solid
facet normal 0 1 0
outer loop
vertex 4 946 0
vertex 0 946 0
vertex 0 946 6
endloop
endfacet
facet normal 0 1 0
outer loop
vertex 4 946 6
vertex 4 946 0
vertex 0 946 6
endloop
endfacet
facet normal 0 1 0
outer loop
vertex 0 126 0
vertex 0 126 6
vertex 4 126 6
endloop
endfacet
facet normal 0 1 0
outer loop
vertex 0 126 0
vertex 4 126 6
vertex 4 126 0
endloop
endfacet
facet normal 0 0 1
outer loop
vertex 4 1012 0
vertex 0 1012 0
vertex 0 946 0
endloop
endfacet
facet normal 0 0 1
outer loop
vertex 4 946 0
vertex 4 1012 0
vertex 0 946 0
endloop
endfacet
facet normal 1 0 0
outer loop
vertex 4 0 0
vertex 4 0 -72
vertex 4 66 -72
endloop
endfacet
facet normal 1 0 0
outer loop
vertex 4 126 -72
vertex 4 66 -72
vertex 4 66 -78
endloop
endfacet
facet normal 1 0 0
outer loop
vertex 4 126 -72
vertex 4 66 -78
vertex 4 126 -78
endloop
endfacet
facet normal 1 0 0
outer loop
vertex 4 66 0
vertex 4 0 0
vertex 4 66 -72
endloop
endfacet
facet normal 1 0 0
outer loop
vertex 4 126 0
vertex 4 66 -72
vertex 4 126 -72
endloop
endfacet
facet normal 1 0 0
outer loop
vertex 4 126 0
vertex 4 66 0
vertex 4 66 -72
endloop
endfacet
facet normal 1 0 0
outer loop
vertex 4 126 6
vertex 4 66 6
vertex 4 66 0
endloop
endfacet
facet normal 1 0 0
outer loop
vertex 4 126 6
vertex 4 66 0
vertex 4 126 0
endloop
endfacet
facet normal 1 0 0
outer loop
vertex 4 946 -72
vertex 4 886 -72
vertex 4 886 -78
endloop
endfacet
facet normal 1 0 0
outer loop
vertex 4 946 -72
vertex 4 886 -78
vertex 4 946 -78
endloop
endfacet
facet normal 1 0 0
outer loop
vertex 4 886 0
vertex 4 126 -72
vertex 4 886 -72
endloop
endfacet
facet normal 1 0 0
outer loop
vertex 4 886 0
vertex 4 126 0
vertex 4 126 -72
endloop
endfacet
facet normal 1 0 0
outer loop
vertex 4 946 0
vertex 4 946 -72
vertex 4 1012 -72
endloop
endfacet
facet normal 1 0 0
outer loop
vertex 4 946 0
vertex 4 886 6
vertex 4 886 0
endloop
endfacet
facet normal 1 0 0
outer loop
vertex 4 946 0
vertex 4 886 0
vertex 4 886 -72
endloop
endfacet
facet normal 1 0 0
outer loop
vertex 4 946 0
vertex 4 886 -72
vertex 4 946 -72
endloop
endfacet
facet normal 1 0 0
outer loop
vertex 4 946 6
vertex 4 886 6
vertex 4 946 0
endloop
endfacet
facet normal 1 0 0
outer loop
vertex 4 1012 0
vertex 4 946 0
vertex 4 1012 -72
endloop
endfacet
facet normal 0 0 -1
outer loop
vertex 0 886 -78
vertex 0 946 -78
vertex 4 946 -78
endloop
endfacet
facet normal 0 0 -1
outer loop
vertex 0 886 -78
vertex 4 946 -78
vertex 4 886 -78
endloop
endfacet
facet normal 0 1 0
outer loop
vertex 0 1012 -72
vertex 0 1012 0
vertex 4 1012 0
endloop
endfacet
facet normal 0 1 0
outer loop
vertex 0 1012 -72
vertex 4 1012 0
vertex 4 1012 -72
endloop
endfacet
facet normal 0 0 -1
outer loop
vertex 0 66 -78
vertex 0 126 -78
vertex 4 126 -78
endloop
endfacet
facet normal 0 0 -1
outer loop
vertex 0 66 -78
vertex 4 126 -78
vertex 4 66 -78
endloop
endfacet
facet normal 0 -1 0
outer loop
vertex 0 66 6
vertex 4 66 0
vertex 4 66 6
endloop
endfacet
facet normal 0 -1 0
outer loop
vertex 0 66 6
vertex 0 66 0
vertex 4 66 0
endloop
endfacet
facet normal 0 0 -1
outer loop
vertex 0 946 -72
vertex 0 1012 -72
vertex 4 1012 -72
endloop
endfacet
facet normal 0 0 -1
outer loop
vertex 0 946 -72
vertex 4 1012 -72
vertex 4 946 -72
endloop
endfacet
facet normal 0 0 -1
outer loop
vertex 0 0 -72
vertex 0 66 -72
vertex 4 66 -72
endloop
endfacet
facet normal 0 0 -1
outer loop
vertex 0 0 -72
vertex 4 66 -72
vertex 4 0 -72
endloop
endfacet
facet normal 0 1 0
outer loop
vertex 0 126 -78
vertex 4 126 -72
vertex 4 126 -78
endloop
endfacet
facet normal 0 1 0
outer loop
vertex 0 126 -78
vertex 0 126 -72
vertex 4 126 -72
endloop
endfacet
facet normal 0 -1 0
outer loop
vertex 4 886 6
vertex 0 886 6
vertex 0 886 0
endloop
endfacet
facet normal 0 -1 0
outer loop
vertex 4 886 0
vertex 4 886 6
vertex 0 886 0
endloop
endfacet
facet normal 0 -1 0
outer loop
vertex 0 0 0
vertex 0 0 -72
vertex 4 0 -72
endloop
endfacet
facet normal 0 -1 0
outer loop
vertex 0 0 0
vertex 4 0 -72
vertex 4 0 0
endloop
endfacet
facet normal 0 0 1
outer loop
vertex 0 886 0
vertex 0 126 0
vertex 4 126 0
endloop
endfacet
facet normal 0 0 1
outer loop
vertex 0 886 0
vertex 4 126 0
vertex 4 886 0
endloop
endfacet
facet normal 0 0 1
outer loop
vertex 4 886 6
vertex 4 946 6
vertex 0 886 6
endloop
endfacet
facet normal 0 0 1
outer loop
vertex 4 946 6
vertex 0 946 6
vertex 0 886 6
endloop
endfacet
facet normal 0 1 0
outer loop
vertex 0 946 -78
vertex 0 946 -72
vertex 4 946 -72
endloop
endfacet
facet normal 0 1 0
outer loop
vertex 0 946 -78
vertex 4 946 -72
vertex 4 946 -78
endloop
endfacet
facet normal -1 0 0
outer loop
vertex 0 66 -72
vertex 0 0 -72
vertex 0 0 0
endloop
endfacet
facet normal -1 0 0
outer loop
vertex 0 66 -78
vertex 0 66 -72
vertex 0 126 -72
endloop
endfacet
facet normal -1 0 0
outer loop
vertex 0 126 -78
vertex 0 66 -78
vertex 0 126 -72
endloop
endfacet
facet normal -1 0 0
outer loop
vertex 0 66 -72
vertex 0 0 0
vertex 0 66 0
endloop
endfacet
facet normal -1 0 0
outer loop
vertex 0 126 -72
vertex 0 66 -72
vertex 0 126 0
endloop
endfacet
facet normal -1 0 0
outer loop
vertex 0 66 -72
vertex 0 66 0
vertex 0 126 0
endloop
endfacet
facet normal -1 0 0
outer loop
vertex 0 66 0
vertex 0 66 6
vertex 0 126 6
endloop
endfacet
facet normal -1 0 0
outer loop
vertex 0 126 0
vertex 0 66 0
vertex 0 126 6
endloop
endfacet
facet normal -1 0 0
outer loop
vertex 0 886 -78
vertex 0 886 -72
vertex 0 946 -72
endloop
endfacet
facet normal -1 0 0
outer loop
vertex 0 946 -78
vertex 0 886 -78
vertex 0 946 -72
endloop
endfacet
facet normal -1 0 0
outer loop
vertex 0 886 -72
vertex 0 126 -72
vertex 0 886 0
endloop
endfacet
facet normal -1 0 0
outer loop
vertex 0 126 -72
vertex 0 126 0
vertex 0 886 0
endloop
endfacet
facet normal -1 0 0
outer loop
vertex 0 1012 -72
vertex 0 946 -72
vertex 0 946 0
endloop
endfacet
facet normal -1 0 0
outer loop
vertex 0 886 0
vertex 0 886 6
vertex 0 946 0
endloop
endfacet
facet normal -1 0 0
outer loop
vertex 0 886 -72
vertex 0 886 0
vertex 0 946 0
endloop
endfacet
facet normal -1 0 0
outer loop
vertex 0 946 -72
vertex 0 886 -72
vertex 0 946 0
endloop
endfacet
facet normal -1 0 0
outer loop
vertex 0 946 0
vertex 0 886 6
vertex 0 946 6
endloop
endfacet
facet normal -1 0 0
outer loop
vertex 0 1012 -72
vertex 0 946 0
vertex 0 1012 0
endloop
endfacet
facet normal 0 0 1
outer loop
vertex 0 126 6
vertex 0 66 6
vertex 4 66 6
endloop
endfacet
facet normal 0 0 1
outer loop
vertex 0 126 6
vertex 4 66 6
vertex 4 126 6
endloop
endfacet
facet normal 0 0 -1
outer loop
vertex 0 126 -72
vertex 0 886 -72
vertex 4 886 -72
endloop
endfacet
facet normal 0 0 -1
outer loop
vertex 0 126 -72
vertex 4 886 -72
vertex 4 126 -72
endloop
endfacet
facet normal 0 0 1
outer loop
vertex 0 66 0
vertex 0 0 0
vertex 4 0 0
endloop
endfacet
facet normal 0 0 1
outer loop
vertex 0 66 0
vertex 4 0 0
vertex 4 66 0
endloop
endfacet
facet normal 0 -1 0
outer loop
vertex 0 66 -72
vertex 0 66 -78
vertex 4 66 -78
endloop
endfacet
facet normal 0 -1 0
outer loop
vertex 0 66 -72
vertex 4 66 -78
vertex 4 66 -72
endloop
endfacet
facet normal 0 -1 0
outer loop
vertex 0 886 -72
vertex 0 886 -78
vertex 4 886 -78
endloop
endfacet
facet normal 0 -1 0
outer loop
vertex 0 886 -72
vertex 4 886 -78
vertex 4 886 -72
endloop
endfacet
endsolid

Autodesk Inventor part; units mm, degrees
ref_plane "YZ Plane" through (0, 0, 0) normal (1, 0, 0) x (0, 1, 0)
ref_plane "XZ Plane" through (0, 0, 0) normal (0, 1, 0) x (-1, 0, 0)
ref_plane "XY Plane" through (0, 0, 0) normal (0, 0, 1) x (1, 0, 0)
sketch "Esboço1" plane through (0, 0, 0) normal (1, 0, 0) x (0, 1, 0)
  line L0 (1012, 0) -> (1012, -72)
  line L1 (0, -72) -> (0, 0)
  line L2 (1012, 0) -> (946, 0)
  line L3 (946, 0) -> (946, 6)
  line L4 (946, 6) -> (886, 6)
  line L5 (886, 6) -> (886, 0)
  line L6 (0, 0) -> (66, 0)
  line L7 (66, 0) -> (66, 6)
  line L8 (66, 6) -> (126, 6)
  line L9 (126, 6) -> (126, 0)
  line L10 (126, 0) -> (886, 0)
  line L11 (1012, -72) -> (946, -72)
  line L12 (946, -72) -> (946, -78)
  line L13 (946, -78) -> (886, -78)
  line L14 (886, -78) -> (886, -72)
  line L15 (886, -72) -> (126, -72)
  line L16 (126, -72) -> (126, -78)
  line L17 (126, -78) -> (66, -78)
  line L18 (66, -78) -> (66, -72)
  line L19 (66, -72) -> (0, -72)
  dimension "d1" = 72
  dimension "d2" = 66
  dimension "d3" = 6
  dimension "d4" = 60
  dimension "d7" = 6
  dimension "d8" = 6
  dimension "d9" = 60
  dimension "d10" = 66
  dimension "d11" = 6
  dimension "d12" = 66
  dimension "d13" = 6
  dimension "d14" = 60
  dimension "d17" = 1012
extrude "Extrusão1" add sketch "Esboço1" along normal blind 4
sketch "Esboço2" plane through (4, 0, 0) normal (1, 0, 0) x (0, 0, -1)
  point P0 (0, 0)
properties part number "FUNDO CONTRA"
